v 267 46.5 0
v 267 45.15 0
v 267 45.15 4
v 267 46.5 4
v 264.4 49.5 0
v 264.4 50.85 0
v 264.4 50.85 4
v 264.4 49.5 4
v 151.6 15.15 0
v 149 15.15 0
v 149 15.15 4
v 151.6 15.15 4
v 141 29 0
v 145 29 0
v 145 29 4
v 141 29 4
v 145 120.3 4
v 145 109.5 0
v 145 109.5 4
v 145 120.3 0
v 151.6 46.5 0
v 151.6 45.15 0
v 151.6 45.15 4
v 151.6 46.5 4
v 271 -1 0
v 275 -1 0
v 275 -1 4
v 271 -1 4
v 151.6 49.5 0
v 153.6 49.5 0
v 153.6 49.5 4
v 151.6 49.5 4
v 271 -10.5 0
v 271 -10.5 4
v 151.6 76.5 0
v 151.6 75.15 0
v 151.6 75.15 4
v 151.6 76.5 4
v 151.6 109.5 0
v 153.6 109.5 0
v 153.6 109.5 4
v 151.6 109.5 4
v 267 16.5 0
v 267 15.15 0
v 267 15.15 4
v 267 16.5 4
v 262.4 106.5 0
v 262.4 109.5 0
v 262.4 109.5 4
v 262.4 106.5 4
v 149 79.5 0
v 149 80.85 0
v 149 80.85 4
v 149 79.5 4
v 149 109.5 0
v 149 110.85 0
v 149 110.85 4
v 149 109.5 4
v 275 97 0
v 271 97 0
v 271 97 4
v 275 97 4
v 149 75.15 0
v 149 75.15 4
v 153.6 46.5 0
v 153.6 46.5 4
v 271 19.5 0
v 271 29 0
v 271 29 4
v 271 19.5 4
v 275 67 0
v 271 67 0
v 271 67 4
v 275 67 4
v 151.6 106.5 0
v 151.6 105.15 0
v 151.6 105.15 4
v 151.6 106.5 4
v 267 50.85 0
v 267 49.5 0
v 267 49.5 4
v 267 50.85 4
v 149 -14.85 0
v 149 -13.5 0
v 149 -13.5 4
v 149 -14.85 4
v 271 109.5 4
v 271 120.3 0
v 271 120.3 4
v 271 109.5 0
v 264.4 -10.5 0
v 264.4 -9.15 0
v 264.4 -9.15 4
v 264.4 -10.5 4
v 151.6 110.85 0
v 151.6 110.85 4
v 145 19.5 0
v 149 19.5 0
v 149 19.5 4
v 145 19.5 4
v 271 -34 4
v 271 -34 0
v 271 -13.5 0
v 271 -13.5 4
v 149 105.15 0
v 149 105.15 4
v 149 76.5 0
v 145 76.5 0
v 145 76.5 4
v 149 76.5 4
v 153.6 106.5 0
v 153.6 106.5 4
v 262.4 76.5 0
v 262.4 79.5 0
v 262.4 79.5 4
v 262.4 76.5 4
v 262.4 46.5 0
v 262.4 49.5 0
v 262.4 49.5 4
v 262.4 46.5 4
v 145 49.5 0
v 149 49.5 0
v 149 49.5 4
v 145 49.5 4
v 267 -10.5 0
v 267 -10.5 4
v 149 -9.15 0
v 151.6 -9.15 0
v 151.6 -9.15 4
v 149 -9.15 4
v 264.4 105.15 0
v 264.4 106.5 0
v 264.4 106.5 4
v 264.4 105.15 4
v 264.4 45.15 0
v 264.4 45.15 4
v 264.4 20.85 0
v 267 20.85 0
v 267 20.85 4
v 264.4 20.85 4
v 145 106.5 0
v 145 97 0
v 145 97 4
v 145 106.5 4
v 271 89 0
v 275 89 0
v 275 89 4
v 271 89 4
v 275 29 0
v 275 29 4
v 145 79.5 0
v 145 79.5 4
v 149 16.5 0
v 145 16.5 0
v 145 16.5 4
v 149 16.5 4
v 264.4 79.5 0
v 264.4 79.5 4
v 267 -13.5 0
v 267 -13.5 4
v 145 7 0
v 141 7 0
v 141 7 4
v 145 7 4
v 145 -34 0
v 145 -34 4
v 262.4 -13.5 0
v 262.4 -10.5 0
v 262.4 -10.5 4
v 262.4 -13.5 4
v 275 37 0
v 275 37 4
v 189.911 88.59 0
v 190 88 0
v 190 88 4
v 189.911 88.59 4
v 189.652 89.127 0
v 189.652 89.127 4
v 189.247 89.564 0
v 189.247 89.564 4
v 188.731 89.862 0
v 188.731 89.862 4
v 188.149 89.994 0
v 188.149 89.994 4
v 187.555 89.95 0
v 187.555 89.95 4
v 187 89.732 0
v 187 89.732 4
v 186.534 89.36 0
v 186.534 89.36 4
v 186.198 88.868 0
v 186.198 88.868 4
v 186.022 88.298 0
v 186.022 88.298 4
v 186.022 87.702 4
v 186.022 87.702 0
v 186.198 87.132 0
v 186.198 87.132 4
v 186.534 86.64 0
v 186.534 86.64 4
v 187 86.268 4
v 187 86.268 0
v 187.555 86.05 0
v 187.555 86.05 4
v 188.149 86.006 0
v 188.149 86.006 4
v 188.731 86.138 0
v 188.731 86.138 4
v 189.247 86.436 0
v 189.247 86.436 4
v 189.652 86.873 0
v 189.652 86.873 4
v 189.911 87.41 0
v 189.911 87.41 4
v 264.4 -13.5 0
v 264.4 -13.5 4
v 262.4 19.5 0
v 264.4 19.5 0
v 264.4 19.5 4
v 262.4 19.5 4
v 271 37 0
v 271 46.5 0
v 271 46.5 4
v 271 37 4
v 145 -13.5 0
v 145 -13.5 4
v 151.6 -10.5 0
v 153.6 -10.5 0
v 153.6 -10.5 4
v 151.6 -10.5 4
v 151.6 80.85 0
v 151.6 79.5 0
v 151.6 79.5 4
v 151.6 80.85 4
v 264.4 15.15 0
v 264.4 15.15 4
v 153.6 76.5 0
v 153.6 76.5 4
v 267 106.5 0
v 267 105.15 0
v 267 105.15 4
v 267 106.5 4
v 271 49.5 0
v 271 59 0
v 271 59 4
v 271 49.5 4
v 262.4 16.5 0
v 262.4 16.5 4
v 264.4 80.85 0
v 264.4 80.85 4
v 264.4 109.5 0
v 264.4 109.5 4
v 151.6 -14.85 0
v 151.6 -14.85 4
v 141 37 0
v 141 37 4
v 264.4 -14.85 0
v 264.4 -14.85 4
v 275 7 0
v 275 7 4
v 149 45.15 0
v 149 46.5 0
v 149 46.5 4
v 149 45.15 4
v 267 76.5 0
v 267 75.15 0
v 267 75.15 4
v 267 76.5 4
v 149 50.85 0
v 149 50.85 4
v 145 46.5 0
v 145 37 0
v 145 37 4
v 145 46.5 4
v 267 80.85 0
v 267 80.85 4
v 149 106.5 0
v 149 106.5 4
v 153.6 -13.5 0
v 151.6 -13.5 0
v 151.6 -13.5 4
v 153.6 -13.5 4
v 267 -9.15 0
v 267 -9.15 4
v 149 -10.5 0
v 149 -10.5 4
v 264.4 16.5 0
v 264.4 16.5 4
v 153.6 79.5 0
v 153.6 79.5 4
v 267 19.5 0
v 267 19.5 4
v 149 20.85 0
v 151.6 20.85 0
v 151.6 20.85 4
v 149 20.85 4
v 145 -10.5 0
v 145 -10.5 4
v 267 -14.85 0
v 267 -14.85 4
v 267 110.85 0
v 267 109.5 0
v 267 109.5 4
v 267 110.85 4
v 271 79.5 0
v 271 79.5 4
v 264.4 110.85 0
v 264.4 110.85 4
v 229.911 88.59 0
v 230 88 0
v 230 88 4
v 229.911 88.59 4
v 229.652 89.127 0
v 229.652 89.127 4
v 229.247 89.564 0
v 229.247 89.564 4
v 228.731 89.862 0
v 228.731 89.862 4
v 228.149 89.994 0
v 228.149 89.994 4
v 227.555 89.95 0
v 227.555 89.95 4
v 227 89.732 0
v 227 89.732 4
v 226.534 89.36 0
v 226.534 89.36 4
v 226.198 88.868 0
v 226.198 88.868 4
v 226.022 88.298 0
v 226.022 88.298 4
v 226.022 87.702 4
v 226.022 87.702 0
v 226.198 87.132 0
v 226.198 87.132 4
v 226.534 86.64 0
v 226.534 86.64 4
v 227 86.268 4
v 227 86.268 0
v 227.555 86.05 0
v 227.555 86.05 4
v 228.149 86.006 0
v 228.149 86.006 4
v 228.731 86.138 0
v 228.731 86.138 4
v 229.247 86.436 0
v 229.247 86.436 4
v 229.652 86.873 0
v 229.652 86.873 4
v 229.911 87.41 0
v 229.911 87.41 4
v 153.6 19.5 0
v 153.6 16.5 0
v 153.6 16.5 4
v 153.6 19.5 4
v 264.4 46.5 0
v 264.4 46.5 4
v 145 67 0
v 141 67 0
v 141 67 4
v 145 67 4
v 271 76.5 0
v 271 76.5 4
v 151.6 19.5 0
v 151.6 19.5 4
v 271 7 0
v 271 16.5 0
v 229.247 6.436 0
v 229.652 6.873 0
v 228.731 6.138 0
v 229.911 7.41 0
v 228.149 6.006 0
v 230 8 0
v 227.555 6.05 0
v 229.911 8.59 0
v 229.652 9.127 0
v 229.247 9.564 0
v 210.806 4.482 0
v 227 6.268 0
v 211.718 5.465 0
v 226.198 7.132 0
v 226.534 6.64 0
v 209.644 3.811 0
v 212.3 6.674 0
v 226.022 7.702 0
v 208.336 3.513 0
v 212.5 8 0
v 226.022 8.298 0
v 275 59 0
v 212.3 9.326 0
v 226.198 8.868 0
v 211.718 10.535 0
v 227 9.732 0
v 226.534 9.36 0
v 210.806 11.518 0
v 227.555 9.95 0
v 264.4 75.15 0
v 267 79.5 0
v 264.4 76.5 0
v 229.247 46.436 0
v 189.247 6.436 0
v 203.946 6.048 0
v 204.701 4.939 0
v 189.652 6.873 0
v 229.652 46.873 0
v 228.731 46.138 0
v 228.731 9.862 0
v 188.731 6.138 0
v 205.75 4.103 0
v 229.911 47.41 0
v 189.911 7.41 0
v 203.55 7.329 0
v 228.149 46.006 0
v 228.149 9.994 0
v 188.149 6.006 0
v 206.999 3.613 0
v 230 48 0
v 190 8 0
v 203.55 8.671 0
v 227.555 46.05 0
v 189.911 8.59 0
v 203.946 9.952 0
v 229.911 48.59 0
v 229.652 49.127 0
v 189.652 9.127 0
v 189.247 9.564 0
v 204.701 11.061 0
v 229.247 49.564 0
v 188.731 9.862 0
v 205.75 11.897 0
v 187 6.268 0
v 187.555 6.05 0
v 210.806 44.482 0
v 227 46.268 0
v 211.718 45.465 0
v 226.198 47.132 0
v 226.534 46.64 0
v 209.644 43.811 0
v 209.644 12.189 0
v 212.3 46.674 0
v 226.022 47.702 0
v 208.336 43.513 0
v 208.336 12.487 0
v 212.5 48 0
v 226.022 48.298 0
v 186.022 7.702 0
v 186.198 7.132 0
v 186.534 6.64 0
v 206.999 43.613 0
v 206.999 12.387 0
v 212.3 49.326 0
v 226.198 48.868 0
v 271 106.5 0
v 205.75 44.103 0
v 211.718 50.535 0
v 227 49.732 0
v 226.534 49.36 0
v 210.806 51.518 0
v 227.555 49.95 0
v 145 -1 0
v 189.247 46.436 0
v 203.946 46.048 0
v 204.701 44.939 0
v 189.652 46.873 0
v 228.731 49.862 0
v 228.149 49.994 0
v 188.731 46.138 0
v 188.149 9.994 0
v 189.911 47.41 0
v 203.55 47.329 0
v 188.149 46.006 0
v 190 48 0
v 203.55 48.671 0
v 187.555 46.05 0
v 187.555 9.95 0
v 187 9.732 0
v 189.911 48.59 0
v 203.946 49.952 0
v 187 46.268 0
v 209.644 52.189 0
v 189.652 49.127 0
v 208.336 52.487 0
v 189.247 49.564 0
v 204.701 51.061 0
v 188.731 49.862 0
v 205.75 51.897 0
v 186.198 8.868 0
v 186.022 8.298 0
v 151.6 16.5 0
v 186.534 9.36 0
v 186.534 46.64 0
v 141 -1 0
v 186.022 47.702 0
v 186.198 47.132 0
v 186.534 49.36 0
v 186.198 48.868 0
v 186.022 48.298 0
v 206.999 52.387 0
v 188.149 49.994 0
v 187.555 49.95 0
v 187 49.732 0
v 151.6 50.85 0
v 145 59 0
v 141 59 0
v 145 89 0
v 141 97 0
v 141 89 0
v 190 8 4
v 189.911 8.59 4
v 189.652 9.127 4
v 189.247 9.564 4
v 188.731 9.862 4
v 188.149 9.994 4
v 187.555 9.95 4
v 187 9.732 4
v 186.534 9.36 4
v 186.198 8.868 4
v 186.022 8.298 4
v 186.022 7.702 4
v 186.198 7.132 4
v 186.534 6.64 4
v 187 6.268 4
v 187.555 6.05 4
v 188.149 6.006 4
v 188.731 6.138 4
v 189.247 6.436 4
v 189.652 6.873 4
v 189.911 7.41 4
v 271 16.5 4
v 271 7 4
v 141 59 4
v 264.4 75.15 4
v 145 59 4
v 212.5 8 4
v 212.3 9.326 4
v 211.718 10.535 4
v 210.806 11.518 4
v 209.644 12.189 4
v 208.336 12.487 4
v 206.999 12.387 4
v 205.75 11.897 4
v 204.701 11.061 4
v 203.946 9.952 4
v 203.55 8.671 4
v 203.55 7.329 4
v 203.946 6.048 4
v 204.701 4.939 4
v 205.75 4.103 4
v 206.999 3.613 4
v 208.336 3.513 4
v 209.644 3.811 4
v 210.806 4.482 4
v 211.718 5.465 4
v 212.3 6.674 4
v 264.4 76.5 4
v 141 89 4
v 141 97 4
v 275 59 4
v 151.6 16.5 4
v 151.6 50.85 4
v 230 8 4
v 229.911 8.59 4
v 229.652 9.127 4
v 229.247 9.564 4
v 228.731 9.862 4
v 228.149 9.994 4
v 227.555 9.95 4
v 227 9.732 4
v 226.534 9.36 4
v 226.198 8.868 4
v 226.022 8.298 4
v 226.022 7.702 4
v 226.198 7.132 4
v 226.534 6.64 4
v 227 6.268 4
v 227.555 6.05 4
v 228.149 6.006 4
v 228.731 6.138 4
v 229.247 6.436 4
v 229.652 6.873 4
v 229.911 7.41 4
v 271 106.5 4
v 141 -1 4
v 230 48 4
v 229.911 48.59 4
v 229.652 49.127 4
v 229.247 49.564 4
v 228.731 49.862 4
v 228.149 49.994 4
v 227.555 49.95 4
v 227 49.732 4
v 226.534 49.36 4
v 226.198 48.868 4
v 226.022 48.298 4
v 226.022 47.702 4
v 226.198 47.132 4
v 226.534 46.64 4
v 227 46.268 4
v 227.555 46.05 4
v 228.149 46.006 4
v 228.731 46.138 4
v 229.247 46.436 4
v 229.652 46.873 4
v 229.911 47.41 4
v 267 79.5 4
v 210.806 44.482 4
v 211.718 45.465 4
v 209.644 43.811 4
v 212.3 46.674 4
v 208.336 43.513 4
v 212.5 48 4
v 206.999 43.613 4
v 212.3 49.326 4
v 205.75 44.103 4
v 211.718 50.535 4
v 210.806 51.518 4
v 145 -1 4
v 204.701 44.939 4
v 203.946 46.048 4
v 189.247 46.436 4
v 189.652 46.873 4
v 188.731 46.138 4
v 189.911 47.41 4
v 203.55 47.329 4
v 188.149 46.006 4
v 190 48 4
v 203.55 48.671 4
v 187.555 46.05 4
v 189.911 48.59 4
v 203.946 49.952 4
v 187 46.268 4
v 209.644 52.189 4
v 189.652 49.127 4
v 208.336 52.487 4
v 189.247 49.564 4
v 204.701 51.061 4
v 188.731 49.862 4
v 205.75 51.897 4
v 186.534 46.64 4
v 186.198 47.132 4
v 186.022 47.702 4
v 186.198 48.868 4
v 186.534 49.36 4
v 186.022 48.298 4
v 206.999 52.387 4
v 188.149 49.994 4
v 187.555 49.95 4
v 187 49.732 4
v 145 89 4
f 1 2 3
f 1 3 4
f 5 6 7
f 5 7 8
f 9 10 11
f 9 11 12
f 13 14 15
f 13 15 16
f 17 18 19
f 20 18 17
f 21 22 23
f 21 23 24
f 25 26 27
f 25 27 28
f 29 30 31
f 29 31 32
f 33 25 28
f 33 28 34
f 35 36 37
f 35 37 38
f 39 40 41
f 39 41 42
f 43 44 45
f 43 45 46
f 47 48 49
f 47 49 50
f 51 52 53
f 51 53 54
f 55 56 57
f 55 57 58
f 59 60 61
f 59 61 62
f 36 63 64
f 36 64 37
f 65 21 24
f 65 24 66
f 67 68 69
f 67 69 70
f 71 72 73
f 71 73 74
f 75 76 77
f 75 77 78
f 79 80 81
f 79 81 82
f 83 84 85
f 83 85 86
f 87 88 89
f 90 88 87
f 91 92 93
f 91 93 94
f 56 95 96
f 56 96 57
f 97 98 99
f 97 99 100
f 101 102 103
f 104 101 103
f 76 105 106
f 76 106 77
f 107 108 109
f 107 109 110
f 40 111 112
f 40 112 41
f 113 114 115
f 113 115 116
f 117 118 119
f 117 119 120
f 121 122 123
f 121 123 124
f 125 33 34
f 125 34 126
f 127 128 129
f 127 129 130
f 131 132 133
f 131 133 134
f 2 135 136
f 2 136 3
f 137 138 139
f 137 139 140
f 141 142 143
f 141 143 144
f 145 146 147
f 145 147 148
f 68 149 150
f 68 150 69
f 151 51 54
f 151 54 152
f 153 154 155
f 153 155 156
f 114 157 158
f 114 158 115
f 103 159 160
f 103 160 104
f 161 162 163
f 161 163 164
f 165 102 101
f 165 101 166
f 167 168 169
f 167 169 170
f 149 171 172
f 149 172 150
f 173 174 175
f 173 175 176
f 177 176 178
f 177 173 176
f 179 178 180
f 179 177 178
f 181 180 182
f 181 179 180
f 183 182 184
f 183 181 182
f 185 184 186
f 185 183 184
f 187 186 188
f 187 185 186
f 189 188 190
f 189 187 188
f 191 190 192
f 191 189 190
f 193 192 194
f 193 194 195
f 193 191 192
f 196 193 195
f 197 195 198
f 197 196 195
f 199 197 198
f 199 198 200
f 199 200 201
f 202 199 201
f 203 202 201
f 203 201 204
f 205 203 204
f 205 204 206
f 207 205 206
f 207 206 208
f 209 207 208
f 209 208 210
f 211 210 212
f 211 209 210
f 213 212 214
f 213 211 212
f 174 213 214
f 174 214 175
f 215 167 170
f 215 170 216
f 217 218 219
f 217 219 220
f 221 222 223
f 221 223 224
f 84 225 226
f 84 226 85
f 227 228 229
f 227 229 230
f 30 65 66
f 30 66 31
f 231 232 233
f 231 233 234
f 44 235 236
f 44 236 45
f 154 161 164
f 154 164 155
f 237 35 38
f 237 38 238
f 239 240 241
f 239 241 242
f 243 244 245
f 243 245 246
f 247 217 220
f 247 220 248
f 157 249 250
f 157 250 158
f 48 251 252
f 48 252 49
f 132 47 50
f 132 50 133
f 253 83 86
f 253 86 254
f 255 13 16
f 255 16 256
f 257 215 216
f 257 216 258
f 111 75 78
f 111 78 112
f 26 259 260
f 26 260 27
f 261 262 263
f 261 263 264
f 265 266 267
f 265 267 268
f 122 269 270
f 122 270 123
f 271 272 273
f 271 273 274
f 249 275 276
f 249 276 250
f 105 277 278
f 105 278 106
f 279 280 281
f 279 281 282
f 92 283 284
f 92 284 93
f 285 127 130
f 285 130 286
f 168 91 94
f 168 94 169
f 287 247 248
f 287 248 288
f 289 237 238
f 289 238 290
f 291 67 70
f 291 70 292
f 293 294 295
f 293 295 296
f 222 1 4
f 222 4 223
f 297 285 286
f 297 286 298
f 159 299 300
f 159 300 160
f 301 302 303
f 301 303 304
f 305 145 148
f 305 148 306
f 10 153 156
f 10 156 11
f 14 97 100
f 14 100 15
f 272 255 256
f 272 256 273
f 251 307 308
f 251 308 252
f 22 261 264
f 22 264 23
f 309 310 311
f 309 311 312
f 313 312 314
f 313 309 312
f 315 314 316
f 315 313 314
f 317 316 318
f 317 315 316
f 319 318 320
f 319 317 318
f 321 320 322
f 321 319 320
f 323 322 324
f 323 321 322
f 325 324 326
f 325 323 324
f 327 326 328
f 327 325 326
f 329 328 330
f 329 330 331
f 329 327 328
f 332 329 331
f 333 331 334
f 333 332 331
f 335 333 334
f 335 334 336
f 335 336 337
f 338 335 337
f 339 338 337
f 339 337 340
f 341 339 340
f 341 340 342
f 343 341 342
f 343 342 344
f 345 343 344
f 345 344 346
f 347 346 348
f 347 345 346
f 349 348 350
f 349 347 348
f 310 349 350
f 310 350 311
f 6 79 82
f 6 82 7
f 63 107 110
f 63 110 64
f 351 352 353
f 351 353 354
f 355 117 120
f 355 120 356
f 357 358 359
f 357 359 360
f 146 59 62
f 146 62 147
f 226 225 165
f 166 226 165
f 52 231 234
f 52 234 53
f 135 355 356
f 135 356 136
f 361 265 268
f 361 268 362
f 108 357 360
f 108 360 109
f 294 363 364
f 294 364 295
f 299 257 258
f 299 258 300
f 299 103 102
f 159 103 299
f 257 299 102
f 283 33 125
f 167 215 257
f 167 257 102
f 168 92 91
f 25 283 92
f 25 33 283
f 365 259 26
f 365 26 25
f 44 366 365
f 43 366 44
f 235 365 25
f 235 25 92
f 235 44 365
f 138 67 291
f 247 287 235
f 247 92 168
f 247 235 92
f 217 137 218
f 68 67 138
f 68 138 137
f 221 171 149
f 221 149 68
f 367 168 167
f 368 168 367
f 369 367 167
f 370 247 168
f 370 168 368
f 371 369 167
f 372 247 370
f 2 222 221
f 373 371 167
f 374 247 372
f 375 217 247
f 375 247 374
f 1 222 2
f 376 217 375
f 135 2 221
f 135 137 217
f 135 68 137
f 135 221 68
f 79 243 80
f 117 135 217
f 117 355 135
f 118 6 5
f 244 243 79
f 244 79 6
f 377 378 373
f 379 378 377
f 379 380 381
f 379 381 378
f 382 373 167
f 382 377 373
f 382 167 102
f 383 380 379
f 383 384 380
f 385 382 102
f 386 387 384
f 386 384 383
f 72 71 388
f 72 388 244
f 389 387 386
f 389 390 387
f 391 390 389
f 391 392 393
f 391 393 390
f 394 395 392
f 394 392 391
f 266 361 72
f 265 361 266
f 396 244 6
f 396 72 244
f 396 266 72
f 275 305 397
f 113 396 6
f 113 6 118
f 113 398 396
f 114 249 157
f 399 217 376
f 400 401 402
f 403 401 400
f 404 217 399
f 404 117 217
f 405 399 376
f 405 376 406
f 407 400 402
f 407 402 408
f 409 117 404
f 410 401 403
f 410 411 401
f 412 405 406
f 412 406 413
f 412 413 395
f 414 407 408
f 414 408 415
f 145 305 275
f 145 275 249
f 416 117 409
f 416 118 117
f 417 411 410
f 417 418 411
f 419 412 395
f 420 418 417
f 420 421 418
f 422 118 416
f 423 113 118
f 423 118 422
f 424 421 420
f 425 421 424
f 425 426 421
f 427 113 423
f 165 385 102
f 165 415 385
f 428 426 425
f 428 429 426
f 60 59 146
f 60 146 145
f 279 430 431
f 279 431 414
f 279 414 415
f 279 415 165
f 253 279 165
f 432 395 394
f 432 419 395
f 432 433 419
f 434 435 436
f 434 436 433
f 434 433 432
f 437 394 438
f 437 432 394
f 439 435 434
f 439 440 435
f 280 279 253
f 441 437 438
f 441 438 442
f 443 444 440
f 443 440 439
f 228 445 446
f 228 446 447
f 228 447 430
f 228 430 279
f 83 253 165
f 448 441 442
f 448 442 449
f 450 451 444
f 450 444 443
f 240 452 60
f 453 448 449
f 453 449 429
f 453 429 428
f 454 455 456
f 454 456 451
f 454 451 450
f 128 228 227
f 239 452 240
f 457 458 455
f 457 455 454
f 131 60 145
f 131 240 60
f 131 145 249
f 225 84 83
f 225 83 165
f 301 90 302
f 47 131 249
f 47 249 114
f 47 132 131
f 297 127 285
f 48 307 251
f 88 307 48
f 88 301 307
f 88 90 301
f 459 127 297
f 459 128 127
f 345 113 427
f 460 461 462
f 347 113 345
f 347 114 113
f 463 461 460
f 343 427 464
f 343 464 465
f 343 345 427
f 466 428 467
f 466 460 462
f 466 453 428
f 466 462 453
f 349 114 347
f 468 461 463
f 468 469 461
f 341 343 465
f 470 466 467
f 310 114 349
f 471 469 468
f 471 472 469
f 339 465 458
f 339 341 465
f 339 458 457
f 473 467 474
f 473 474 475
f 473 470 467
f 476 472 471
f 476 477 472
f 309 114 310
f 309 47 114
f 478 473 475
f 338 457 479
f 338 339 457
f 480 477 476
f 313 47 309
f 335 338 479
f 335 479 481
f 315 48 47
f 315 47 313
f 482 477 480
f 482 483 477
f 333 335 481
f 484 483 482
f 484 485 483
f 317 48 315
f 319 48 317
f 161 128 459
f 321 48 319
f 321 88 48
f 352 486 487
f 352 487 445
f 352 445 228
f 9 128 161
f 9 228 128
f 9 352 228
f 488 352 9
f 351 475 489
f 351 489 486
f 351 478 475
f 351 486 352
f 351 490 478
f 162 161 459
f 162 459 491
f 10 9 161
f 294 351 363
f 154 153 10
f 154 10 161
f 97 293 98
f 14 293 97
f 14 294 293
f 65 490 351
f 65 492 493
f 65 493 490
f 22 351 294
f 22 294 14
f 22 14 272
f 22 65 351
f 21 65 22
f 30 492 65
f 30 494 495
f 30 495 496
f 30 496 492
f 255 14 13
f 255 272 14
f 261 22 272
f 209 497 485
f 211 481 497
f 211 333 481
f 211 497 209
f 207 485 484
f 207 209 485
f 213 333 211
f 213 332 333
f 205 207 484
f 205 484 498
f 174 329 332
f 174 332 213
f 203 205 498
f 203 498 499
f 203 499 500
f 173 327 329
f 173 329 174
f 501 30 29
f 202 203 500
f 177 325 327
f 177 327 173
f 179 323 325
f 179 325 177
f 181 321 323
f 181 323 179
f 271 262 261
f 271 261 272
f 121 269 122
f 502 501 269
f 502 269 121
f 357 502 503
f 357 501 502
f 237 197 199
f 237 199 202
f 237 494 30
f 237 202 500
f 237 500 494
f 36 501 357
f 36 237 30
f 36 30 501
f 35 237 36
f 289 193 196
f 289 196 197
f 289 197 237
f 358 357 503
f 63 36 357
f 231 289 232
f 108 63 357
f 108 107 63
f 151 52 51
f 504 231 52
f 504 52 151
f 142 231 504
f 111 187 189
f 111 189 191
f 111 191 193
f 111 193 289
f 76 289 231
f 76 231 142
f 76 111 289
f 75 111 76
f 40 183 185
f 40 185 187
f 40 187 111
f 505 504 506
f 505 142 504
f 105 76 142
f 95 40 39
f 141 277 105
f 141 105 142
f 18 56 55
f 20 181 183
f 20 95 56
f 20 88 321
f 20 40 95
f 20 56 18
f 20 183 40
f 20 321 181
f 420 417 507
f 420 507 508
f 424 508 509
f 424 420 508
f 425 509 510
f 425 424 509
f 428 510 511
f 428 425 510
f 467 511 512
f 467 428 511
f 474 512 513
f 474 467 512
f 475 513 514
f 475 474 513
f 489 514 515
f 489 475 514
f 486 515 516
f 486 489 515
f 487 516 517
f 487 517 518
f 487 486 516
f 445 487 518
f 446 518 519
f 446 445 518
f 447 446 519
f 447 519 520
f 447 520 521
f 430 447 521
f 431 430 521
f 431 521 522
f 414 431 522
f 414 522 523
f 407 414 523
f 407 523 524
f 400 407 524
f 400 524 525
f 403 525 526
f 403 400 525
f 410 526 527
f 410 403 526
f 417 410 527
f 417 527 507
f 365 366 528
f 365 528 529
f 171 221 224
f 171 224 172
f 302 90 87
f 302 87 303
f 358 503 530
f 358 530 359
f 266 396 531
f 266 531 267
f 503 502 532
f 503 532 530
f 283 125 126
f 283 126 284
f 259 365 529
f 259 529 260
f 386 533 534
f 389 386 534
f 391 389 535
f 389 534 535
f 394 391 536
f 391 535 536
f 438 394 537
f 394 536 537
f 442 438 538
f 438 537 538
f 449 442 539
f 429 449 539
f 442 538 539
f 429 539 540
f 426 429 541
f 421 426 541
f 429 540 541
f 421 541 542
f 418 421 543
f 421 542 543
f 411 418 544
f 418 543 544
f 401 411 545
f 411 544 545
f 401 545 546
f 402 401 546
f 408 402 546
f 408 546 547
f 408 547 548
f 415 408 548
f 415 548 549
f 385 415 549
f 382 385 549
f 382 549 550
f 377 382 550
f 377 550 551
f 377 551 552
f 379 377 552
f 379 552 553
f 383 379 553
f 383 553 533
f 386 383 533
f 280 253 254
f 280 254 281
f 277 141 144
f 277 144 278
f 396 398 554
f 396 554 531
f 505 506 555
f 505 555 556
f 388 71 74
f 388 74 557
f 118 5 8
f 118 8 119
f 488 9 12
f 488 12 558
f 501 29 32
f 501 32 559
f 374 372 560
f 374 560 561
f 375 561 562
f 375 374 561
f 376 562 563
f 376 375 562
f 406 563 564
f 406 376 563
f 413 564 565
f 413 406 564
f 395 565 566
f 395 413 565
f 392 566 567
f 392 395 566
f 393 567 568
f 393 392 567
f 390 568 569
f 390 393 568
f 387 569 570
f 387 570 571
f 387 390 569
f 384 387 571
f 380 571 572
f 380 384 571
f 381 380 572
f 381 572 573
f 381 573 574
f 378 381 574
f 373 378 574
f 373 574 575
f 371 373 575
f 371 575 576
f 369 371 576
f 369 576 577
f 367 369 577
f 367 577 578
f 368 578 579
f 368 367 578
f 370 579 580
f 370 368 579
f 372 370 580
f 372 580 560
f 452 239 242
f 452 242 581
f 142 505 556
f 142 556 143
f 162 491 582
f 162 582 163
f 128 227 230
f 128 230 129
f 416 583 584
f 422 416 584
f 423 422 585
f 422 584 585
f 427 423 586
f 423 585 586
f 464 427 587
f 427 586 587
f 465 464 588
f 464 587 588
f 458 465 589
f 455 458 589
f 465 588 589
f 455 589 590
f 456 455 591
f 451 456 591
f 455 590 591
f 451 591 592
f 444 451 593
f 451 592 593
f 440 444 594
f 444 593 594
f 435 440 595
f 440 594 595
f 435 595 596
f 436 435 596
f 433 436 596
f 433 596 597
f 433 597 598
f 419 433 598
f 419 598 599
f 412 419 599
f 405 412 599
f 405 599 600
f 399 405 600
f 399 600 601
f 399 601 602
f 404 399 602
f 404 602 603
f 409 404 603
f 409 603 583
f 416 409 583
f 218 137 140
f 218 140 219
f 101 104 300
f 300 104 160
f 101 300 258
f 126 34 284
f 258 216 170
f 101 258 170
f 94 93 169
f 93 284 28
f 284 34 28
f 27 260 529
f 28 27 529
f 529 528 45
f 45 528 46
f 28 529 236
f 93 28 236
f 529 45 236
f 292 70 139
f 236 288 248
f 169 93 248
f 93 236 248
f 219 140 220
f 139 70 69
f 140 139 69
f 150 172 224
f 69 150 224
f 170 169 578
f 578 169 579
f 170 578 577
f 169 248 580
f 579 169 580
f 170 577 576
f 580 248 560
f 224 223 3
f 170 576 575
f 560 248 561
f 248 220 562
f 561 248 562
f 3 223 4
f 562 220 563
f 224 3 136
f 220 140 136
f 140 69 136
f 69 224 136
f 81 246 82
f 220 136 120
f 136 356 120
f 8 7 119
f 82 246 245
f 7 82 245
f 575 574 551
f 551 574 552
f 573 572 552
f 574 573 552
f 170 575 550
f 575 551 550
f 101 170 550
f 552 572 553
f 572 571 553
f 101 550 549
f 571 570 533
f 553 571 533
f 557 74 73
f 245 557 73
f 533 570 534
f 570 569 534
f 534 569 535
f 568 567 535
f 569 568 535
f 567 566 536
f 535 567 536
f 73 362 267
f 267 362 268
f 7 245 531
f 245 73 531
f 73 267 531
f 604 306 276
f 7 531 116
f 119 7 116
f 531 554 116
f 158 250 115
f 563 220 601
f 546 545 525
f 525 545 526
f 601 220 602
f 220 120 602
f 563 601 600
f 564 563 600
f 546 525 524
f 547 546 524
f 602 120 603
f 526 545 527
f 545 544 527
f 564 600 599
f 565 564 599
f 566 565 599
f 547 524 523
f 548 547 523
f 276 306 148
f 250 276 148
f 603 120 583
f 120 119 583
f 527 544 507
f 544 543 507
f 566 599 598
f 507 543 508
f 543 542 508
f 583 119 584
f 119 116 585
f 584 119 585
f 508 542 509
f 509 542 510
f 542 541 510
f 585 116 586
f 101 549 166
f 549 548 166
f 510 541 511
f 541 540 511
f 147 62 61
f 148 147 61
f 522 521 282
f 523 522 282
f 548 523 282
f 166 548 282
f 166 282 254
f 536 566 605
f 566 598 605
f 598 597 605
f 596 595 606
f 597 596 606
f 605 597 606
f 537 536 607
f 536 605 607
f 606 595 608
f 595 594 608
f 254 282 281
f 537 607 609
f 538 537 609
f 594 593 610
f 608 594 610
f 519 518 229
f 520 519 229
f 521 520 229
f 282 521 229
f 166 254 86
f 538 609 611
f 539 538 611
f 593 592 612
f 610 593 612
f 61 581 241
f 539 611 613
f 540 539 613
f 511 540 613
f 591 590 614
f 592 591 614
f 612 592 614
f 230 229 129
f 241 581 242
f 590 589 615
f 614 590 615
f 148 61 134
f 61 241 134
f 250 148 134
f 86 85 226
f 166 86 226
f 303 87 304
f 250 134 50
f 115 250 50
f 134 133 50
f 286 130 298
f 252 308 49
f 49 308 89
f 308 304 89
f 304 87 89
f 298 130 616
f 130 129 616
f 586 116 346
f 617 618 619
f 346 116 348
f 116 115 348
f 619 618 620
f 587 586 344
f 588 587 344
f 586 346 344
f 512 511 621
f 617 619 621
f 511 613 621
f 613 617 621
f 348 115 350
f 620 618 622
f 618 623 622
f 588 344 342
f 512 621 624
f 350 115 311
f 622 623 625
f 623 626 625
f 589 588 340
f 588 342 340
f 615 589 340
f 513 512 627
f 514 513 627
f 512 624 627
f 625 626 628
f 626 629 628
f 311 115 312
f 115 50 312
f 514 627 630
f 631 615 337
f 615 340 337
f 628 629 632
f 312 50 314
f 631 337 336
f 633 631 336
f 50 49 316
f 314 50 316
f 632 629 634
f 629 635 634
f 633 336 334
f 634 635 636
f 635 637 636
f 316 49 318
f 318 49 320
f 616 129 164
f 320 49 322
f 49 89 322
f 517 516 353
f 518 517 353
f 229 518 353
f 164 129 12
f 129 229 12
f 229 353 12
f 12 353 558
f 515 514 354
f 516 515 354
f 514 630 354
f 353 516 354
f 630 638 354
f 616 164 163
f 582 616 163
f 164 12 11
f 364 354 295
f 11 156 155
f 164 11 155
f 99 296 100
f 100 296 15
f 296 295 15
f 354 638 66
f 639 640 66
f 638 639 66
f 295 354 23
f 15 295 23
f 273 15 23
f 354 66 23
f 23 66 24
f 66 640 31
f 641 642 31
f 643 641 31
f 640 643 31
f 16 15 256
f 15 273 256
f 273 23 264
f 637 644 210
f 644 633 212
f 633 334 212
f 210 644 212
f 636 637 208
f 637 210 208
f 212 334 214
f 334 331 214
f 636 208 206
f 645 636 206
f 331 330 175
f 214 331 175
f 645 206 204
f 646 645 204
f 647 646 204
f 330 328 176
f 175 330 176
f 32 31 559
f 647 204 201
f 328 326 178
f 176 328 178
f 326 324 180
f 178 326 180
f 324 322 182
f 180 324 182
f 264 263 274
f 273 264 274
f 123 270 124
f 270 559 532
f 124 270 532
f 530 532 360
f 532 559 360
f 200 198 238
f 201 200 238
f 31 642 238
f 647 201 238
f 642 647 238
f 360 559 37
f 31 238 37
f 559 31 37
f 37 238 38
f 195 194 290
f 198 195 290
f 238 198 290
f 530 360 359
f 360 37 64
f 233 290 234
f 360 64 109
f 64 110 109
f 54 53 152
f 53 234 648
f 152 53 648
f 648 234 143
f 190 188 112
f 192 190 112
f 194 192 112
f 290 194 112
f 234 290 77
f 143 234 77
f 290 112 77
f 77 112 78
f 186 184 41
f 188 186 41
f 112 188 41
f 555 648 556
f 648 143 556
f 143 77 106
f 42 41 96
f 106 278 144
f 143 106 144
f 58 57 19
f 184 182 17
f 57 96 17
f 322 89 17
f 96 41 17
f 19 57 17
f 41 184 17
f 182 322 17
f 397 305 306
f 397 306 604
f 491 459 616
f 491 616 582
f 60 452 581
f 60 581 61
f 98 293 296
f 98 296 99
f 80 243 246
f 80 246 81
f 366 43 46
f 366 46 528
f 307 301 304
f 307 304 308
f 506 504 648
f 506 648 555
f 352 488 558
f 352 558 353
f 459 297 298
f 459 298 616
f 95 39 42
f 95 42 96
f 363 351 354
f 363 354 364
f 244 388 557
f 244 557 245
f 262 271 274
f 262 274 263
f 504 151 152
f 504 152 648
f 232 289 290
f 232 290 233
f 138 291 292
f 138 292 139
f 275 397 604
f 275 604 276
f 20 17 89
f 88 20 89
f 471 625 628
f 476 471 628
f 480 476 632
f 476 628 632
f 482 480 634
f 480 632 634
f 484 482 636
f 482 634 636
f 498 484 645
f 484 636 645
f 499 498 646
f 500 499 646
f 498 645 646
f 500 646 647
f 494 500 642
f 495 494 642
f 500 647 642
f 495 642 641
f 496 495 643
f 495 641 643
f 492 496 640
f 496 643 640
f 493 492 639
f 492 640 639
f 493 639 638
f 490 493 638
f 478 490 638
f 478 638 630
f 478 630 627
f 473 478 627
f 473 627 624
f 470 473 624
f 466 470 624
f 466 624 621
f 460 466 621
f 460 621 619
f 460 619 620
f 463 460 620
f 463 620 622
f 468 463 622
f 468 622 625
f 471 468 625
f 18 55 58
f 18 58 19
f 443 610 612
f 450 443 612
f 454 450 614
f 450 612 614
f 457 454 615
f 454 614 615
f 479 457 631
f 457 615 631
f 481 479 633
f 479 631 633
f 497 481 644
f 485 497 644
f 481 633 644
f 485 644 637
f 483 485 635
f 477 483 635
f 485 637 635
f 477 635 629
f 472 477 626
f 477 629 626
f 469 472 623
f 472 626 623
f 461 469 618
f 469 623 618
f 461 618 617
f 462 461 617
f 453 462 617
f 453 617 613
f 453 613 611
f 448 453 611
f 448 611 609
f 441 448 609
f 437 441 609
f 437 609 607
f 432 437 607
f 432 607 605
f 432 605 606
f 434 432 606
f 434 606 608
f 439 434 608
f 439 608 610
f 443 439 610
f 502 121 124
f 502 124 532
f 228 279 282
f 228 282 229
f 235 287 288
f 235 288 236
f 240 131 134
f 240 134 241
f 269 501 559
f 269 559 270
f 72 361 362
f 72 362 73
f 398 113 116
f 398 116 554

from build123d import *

# Parameters (mm, degrees)
SKETCH_1_R          = 2
EXTRUDE_1_DEPTH     = 4
SKETCH_3_W          = 126
SKETCH_3_H          = 2.7
CUT_EXTRUDE_1_DEPTH = 10
SKETCH_4_R          = 4.5
SKETCH_4_R_2        = 2
CUT_EXTRUDE_2_DEPTH = 10


with BuildPart() as part:
    # 草图1 → 凸台-拉伸1 (new body)
    with BuildSketch(Plane.XY):
        Polygon((145, 46.5), (149, 46.5), (149, 45.15), (151.6, 45.15), (151.6, 46.5), (153.6, 46.5), (153.6, 49.5), (151.6, 49.5), (151.6, 50.85), (149, 50.85), (149, 49.5), (145, 49.5), (145, 59), (141, 59), (141, 67), (145, 67), (145, 76.5), (149, 76.5), (149, 75.15), (151.6, 75.15), (151.6, 76.5), (153.6, 76.5), (153.6, 79.5), (151.6, 79.5), (151.6, 80.85), (149, 80.85), (149, 79.5), (145, 79.5), (145, 89), (141, 89), (141, 97), (145, 97), (145, 106.5), (149, 106.5), (149, 105.15), (151.6, 105.15), (151.6, 106.5), (153.6, 106.5), (153.6, 109.5), (151.6, 109.5), (151.6, 110.85), (149, 110.85), (149, 109.5), (145, 109.5), (145, 123), (271, 123), (271, 109.5), (267, 109.5), (267, 110.85), (264.4, 110.85), (264.4, 109.5), (262.4, 109.5), (262.4, 106.5), (264.4, 106.5), (264.4, 105.15), (267, 105.15), (267, 106.5), (271, 106.5), (271, 97), (275, 97), (275, 89), (271, 89), (271, 79.5), (267, 79.5), (267, 80.85), (264.4, 80.85), (264.4, 79.5), (262.4, 79.5), (262.4, 76.5), (264.4, 76.5), (264.4, 75.15), (267, 75.15), (267, 76.5), (271, 76.5), (271, 67), (275, 67), (275, 59), (271, 59), (271, 49.5), (267, 49.5), (267, 50.85), (264.4, 50.85), (264.4, 49.5), (262.4, 49.5), (262.4, 46.5), (264.4, 46.5), (264.4, 45.15), (267, 45.15), (267, 46.5), (271, 46.5), (271, 37), (275, 37), (275, 29), (271, 29), (271, 19.5), (267, 19.5), (267, 20.85), (264.4, 20.85), (264.4, 19.5), (262.4, 19.5), (262.4, 16.5), (264.4, 16.5), (264.4, 15.15), (267, 15.15), (267, 16.5), (271, 16.5), (271, 7), (275, 7), (275, -1), (271, -1), (271, -10.5), (267, -10.5), (267, -9.15), (264.4, -9.15), (264.4, -10.5), (262.4, -10.5), (262.4, -13.5), (264.4, -13.5), (264.4, -14.85), (267, -14.85), (267, -13.5), (271, -13.5), (271, -27), (271, -34), (145, -34), (145, -27), (145, -13.5), (149, -13.5), (149, -14.85), (151.6, -14.85), (151.6, -13.5), (153.6, -13.5), (153.6, -10.5), (151.6, -10.5), (151.6, -9.15), (149, -9.15), (149, -10.5), (145, -10.5), (145, -1), (141, -1), (141, 7), (145, 7), (145, 16.5), (149, 16.5), (149, 15.15), (151.6, 15.15), (151.6, 16.5), (153.6, 16.5), (153.6, 19.5), (151.6, 19.5), (151.6, 20.85), (149, 20.85), (149, 19.5), (145, 19.5), (145, 29), (141, 29), (141, 37), (145, 37), align=None)
        with Locations((188, 8)):
            Circle(SKETCH_1_R, mode=Mode.SUBTRACT)
        with Locations((228, 8)):
            Circle(SKETCH_1_R, mode=Mode.SUBTRACT)
        with Locations((228, 88)):
            Circle(SKETCH_1_R, mode=Mode.SUBTRACT)
        with Locations((188, 88)):
            Circle(SKETCH_1_R, mode=Mode.SUBTRACT)
    extrude(amount=EXTRUDE_1_DEPTH)

    # 草图3 → 切除-拉伸1 (cut)
    with BuildSketch(Plane.XY.offset(4)):
        with Locations((208, 121.65)):
            Rectangle(SKETCH_3_W, SKETCH_3_H)
    extrude(amount=-CUT_EXTRUDE_1_DEPTH, mode=Mode.SUBTRACT)

    # 草图4 → 切除-拉伸2 (cut)
    with BuildSketch(Plane.XY.offset(4)):
        with Locations((208, 8)):
            Circle(SKETCH_4_R)
        with Locations((228, 48)):
            Circle(SKETCH_4_R_2)
        with Locations((188, 48)):
            Circle(SKETCH_4_R_2)
        with Locations((208, 48)):
            Circle(SKETCH_4_R)
    extrude(amount=-CUT_EXTRUDE_2_DEPTH, mode=Mode.SUBTRACT)


solid = part.part
